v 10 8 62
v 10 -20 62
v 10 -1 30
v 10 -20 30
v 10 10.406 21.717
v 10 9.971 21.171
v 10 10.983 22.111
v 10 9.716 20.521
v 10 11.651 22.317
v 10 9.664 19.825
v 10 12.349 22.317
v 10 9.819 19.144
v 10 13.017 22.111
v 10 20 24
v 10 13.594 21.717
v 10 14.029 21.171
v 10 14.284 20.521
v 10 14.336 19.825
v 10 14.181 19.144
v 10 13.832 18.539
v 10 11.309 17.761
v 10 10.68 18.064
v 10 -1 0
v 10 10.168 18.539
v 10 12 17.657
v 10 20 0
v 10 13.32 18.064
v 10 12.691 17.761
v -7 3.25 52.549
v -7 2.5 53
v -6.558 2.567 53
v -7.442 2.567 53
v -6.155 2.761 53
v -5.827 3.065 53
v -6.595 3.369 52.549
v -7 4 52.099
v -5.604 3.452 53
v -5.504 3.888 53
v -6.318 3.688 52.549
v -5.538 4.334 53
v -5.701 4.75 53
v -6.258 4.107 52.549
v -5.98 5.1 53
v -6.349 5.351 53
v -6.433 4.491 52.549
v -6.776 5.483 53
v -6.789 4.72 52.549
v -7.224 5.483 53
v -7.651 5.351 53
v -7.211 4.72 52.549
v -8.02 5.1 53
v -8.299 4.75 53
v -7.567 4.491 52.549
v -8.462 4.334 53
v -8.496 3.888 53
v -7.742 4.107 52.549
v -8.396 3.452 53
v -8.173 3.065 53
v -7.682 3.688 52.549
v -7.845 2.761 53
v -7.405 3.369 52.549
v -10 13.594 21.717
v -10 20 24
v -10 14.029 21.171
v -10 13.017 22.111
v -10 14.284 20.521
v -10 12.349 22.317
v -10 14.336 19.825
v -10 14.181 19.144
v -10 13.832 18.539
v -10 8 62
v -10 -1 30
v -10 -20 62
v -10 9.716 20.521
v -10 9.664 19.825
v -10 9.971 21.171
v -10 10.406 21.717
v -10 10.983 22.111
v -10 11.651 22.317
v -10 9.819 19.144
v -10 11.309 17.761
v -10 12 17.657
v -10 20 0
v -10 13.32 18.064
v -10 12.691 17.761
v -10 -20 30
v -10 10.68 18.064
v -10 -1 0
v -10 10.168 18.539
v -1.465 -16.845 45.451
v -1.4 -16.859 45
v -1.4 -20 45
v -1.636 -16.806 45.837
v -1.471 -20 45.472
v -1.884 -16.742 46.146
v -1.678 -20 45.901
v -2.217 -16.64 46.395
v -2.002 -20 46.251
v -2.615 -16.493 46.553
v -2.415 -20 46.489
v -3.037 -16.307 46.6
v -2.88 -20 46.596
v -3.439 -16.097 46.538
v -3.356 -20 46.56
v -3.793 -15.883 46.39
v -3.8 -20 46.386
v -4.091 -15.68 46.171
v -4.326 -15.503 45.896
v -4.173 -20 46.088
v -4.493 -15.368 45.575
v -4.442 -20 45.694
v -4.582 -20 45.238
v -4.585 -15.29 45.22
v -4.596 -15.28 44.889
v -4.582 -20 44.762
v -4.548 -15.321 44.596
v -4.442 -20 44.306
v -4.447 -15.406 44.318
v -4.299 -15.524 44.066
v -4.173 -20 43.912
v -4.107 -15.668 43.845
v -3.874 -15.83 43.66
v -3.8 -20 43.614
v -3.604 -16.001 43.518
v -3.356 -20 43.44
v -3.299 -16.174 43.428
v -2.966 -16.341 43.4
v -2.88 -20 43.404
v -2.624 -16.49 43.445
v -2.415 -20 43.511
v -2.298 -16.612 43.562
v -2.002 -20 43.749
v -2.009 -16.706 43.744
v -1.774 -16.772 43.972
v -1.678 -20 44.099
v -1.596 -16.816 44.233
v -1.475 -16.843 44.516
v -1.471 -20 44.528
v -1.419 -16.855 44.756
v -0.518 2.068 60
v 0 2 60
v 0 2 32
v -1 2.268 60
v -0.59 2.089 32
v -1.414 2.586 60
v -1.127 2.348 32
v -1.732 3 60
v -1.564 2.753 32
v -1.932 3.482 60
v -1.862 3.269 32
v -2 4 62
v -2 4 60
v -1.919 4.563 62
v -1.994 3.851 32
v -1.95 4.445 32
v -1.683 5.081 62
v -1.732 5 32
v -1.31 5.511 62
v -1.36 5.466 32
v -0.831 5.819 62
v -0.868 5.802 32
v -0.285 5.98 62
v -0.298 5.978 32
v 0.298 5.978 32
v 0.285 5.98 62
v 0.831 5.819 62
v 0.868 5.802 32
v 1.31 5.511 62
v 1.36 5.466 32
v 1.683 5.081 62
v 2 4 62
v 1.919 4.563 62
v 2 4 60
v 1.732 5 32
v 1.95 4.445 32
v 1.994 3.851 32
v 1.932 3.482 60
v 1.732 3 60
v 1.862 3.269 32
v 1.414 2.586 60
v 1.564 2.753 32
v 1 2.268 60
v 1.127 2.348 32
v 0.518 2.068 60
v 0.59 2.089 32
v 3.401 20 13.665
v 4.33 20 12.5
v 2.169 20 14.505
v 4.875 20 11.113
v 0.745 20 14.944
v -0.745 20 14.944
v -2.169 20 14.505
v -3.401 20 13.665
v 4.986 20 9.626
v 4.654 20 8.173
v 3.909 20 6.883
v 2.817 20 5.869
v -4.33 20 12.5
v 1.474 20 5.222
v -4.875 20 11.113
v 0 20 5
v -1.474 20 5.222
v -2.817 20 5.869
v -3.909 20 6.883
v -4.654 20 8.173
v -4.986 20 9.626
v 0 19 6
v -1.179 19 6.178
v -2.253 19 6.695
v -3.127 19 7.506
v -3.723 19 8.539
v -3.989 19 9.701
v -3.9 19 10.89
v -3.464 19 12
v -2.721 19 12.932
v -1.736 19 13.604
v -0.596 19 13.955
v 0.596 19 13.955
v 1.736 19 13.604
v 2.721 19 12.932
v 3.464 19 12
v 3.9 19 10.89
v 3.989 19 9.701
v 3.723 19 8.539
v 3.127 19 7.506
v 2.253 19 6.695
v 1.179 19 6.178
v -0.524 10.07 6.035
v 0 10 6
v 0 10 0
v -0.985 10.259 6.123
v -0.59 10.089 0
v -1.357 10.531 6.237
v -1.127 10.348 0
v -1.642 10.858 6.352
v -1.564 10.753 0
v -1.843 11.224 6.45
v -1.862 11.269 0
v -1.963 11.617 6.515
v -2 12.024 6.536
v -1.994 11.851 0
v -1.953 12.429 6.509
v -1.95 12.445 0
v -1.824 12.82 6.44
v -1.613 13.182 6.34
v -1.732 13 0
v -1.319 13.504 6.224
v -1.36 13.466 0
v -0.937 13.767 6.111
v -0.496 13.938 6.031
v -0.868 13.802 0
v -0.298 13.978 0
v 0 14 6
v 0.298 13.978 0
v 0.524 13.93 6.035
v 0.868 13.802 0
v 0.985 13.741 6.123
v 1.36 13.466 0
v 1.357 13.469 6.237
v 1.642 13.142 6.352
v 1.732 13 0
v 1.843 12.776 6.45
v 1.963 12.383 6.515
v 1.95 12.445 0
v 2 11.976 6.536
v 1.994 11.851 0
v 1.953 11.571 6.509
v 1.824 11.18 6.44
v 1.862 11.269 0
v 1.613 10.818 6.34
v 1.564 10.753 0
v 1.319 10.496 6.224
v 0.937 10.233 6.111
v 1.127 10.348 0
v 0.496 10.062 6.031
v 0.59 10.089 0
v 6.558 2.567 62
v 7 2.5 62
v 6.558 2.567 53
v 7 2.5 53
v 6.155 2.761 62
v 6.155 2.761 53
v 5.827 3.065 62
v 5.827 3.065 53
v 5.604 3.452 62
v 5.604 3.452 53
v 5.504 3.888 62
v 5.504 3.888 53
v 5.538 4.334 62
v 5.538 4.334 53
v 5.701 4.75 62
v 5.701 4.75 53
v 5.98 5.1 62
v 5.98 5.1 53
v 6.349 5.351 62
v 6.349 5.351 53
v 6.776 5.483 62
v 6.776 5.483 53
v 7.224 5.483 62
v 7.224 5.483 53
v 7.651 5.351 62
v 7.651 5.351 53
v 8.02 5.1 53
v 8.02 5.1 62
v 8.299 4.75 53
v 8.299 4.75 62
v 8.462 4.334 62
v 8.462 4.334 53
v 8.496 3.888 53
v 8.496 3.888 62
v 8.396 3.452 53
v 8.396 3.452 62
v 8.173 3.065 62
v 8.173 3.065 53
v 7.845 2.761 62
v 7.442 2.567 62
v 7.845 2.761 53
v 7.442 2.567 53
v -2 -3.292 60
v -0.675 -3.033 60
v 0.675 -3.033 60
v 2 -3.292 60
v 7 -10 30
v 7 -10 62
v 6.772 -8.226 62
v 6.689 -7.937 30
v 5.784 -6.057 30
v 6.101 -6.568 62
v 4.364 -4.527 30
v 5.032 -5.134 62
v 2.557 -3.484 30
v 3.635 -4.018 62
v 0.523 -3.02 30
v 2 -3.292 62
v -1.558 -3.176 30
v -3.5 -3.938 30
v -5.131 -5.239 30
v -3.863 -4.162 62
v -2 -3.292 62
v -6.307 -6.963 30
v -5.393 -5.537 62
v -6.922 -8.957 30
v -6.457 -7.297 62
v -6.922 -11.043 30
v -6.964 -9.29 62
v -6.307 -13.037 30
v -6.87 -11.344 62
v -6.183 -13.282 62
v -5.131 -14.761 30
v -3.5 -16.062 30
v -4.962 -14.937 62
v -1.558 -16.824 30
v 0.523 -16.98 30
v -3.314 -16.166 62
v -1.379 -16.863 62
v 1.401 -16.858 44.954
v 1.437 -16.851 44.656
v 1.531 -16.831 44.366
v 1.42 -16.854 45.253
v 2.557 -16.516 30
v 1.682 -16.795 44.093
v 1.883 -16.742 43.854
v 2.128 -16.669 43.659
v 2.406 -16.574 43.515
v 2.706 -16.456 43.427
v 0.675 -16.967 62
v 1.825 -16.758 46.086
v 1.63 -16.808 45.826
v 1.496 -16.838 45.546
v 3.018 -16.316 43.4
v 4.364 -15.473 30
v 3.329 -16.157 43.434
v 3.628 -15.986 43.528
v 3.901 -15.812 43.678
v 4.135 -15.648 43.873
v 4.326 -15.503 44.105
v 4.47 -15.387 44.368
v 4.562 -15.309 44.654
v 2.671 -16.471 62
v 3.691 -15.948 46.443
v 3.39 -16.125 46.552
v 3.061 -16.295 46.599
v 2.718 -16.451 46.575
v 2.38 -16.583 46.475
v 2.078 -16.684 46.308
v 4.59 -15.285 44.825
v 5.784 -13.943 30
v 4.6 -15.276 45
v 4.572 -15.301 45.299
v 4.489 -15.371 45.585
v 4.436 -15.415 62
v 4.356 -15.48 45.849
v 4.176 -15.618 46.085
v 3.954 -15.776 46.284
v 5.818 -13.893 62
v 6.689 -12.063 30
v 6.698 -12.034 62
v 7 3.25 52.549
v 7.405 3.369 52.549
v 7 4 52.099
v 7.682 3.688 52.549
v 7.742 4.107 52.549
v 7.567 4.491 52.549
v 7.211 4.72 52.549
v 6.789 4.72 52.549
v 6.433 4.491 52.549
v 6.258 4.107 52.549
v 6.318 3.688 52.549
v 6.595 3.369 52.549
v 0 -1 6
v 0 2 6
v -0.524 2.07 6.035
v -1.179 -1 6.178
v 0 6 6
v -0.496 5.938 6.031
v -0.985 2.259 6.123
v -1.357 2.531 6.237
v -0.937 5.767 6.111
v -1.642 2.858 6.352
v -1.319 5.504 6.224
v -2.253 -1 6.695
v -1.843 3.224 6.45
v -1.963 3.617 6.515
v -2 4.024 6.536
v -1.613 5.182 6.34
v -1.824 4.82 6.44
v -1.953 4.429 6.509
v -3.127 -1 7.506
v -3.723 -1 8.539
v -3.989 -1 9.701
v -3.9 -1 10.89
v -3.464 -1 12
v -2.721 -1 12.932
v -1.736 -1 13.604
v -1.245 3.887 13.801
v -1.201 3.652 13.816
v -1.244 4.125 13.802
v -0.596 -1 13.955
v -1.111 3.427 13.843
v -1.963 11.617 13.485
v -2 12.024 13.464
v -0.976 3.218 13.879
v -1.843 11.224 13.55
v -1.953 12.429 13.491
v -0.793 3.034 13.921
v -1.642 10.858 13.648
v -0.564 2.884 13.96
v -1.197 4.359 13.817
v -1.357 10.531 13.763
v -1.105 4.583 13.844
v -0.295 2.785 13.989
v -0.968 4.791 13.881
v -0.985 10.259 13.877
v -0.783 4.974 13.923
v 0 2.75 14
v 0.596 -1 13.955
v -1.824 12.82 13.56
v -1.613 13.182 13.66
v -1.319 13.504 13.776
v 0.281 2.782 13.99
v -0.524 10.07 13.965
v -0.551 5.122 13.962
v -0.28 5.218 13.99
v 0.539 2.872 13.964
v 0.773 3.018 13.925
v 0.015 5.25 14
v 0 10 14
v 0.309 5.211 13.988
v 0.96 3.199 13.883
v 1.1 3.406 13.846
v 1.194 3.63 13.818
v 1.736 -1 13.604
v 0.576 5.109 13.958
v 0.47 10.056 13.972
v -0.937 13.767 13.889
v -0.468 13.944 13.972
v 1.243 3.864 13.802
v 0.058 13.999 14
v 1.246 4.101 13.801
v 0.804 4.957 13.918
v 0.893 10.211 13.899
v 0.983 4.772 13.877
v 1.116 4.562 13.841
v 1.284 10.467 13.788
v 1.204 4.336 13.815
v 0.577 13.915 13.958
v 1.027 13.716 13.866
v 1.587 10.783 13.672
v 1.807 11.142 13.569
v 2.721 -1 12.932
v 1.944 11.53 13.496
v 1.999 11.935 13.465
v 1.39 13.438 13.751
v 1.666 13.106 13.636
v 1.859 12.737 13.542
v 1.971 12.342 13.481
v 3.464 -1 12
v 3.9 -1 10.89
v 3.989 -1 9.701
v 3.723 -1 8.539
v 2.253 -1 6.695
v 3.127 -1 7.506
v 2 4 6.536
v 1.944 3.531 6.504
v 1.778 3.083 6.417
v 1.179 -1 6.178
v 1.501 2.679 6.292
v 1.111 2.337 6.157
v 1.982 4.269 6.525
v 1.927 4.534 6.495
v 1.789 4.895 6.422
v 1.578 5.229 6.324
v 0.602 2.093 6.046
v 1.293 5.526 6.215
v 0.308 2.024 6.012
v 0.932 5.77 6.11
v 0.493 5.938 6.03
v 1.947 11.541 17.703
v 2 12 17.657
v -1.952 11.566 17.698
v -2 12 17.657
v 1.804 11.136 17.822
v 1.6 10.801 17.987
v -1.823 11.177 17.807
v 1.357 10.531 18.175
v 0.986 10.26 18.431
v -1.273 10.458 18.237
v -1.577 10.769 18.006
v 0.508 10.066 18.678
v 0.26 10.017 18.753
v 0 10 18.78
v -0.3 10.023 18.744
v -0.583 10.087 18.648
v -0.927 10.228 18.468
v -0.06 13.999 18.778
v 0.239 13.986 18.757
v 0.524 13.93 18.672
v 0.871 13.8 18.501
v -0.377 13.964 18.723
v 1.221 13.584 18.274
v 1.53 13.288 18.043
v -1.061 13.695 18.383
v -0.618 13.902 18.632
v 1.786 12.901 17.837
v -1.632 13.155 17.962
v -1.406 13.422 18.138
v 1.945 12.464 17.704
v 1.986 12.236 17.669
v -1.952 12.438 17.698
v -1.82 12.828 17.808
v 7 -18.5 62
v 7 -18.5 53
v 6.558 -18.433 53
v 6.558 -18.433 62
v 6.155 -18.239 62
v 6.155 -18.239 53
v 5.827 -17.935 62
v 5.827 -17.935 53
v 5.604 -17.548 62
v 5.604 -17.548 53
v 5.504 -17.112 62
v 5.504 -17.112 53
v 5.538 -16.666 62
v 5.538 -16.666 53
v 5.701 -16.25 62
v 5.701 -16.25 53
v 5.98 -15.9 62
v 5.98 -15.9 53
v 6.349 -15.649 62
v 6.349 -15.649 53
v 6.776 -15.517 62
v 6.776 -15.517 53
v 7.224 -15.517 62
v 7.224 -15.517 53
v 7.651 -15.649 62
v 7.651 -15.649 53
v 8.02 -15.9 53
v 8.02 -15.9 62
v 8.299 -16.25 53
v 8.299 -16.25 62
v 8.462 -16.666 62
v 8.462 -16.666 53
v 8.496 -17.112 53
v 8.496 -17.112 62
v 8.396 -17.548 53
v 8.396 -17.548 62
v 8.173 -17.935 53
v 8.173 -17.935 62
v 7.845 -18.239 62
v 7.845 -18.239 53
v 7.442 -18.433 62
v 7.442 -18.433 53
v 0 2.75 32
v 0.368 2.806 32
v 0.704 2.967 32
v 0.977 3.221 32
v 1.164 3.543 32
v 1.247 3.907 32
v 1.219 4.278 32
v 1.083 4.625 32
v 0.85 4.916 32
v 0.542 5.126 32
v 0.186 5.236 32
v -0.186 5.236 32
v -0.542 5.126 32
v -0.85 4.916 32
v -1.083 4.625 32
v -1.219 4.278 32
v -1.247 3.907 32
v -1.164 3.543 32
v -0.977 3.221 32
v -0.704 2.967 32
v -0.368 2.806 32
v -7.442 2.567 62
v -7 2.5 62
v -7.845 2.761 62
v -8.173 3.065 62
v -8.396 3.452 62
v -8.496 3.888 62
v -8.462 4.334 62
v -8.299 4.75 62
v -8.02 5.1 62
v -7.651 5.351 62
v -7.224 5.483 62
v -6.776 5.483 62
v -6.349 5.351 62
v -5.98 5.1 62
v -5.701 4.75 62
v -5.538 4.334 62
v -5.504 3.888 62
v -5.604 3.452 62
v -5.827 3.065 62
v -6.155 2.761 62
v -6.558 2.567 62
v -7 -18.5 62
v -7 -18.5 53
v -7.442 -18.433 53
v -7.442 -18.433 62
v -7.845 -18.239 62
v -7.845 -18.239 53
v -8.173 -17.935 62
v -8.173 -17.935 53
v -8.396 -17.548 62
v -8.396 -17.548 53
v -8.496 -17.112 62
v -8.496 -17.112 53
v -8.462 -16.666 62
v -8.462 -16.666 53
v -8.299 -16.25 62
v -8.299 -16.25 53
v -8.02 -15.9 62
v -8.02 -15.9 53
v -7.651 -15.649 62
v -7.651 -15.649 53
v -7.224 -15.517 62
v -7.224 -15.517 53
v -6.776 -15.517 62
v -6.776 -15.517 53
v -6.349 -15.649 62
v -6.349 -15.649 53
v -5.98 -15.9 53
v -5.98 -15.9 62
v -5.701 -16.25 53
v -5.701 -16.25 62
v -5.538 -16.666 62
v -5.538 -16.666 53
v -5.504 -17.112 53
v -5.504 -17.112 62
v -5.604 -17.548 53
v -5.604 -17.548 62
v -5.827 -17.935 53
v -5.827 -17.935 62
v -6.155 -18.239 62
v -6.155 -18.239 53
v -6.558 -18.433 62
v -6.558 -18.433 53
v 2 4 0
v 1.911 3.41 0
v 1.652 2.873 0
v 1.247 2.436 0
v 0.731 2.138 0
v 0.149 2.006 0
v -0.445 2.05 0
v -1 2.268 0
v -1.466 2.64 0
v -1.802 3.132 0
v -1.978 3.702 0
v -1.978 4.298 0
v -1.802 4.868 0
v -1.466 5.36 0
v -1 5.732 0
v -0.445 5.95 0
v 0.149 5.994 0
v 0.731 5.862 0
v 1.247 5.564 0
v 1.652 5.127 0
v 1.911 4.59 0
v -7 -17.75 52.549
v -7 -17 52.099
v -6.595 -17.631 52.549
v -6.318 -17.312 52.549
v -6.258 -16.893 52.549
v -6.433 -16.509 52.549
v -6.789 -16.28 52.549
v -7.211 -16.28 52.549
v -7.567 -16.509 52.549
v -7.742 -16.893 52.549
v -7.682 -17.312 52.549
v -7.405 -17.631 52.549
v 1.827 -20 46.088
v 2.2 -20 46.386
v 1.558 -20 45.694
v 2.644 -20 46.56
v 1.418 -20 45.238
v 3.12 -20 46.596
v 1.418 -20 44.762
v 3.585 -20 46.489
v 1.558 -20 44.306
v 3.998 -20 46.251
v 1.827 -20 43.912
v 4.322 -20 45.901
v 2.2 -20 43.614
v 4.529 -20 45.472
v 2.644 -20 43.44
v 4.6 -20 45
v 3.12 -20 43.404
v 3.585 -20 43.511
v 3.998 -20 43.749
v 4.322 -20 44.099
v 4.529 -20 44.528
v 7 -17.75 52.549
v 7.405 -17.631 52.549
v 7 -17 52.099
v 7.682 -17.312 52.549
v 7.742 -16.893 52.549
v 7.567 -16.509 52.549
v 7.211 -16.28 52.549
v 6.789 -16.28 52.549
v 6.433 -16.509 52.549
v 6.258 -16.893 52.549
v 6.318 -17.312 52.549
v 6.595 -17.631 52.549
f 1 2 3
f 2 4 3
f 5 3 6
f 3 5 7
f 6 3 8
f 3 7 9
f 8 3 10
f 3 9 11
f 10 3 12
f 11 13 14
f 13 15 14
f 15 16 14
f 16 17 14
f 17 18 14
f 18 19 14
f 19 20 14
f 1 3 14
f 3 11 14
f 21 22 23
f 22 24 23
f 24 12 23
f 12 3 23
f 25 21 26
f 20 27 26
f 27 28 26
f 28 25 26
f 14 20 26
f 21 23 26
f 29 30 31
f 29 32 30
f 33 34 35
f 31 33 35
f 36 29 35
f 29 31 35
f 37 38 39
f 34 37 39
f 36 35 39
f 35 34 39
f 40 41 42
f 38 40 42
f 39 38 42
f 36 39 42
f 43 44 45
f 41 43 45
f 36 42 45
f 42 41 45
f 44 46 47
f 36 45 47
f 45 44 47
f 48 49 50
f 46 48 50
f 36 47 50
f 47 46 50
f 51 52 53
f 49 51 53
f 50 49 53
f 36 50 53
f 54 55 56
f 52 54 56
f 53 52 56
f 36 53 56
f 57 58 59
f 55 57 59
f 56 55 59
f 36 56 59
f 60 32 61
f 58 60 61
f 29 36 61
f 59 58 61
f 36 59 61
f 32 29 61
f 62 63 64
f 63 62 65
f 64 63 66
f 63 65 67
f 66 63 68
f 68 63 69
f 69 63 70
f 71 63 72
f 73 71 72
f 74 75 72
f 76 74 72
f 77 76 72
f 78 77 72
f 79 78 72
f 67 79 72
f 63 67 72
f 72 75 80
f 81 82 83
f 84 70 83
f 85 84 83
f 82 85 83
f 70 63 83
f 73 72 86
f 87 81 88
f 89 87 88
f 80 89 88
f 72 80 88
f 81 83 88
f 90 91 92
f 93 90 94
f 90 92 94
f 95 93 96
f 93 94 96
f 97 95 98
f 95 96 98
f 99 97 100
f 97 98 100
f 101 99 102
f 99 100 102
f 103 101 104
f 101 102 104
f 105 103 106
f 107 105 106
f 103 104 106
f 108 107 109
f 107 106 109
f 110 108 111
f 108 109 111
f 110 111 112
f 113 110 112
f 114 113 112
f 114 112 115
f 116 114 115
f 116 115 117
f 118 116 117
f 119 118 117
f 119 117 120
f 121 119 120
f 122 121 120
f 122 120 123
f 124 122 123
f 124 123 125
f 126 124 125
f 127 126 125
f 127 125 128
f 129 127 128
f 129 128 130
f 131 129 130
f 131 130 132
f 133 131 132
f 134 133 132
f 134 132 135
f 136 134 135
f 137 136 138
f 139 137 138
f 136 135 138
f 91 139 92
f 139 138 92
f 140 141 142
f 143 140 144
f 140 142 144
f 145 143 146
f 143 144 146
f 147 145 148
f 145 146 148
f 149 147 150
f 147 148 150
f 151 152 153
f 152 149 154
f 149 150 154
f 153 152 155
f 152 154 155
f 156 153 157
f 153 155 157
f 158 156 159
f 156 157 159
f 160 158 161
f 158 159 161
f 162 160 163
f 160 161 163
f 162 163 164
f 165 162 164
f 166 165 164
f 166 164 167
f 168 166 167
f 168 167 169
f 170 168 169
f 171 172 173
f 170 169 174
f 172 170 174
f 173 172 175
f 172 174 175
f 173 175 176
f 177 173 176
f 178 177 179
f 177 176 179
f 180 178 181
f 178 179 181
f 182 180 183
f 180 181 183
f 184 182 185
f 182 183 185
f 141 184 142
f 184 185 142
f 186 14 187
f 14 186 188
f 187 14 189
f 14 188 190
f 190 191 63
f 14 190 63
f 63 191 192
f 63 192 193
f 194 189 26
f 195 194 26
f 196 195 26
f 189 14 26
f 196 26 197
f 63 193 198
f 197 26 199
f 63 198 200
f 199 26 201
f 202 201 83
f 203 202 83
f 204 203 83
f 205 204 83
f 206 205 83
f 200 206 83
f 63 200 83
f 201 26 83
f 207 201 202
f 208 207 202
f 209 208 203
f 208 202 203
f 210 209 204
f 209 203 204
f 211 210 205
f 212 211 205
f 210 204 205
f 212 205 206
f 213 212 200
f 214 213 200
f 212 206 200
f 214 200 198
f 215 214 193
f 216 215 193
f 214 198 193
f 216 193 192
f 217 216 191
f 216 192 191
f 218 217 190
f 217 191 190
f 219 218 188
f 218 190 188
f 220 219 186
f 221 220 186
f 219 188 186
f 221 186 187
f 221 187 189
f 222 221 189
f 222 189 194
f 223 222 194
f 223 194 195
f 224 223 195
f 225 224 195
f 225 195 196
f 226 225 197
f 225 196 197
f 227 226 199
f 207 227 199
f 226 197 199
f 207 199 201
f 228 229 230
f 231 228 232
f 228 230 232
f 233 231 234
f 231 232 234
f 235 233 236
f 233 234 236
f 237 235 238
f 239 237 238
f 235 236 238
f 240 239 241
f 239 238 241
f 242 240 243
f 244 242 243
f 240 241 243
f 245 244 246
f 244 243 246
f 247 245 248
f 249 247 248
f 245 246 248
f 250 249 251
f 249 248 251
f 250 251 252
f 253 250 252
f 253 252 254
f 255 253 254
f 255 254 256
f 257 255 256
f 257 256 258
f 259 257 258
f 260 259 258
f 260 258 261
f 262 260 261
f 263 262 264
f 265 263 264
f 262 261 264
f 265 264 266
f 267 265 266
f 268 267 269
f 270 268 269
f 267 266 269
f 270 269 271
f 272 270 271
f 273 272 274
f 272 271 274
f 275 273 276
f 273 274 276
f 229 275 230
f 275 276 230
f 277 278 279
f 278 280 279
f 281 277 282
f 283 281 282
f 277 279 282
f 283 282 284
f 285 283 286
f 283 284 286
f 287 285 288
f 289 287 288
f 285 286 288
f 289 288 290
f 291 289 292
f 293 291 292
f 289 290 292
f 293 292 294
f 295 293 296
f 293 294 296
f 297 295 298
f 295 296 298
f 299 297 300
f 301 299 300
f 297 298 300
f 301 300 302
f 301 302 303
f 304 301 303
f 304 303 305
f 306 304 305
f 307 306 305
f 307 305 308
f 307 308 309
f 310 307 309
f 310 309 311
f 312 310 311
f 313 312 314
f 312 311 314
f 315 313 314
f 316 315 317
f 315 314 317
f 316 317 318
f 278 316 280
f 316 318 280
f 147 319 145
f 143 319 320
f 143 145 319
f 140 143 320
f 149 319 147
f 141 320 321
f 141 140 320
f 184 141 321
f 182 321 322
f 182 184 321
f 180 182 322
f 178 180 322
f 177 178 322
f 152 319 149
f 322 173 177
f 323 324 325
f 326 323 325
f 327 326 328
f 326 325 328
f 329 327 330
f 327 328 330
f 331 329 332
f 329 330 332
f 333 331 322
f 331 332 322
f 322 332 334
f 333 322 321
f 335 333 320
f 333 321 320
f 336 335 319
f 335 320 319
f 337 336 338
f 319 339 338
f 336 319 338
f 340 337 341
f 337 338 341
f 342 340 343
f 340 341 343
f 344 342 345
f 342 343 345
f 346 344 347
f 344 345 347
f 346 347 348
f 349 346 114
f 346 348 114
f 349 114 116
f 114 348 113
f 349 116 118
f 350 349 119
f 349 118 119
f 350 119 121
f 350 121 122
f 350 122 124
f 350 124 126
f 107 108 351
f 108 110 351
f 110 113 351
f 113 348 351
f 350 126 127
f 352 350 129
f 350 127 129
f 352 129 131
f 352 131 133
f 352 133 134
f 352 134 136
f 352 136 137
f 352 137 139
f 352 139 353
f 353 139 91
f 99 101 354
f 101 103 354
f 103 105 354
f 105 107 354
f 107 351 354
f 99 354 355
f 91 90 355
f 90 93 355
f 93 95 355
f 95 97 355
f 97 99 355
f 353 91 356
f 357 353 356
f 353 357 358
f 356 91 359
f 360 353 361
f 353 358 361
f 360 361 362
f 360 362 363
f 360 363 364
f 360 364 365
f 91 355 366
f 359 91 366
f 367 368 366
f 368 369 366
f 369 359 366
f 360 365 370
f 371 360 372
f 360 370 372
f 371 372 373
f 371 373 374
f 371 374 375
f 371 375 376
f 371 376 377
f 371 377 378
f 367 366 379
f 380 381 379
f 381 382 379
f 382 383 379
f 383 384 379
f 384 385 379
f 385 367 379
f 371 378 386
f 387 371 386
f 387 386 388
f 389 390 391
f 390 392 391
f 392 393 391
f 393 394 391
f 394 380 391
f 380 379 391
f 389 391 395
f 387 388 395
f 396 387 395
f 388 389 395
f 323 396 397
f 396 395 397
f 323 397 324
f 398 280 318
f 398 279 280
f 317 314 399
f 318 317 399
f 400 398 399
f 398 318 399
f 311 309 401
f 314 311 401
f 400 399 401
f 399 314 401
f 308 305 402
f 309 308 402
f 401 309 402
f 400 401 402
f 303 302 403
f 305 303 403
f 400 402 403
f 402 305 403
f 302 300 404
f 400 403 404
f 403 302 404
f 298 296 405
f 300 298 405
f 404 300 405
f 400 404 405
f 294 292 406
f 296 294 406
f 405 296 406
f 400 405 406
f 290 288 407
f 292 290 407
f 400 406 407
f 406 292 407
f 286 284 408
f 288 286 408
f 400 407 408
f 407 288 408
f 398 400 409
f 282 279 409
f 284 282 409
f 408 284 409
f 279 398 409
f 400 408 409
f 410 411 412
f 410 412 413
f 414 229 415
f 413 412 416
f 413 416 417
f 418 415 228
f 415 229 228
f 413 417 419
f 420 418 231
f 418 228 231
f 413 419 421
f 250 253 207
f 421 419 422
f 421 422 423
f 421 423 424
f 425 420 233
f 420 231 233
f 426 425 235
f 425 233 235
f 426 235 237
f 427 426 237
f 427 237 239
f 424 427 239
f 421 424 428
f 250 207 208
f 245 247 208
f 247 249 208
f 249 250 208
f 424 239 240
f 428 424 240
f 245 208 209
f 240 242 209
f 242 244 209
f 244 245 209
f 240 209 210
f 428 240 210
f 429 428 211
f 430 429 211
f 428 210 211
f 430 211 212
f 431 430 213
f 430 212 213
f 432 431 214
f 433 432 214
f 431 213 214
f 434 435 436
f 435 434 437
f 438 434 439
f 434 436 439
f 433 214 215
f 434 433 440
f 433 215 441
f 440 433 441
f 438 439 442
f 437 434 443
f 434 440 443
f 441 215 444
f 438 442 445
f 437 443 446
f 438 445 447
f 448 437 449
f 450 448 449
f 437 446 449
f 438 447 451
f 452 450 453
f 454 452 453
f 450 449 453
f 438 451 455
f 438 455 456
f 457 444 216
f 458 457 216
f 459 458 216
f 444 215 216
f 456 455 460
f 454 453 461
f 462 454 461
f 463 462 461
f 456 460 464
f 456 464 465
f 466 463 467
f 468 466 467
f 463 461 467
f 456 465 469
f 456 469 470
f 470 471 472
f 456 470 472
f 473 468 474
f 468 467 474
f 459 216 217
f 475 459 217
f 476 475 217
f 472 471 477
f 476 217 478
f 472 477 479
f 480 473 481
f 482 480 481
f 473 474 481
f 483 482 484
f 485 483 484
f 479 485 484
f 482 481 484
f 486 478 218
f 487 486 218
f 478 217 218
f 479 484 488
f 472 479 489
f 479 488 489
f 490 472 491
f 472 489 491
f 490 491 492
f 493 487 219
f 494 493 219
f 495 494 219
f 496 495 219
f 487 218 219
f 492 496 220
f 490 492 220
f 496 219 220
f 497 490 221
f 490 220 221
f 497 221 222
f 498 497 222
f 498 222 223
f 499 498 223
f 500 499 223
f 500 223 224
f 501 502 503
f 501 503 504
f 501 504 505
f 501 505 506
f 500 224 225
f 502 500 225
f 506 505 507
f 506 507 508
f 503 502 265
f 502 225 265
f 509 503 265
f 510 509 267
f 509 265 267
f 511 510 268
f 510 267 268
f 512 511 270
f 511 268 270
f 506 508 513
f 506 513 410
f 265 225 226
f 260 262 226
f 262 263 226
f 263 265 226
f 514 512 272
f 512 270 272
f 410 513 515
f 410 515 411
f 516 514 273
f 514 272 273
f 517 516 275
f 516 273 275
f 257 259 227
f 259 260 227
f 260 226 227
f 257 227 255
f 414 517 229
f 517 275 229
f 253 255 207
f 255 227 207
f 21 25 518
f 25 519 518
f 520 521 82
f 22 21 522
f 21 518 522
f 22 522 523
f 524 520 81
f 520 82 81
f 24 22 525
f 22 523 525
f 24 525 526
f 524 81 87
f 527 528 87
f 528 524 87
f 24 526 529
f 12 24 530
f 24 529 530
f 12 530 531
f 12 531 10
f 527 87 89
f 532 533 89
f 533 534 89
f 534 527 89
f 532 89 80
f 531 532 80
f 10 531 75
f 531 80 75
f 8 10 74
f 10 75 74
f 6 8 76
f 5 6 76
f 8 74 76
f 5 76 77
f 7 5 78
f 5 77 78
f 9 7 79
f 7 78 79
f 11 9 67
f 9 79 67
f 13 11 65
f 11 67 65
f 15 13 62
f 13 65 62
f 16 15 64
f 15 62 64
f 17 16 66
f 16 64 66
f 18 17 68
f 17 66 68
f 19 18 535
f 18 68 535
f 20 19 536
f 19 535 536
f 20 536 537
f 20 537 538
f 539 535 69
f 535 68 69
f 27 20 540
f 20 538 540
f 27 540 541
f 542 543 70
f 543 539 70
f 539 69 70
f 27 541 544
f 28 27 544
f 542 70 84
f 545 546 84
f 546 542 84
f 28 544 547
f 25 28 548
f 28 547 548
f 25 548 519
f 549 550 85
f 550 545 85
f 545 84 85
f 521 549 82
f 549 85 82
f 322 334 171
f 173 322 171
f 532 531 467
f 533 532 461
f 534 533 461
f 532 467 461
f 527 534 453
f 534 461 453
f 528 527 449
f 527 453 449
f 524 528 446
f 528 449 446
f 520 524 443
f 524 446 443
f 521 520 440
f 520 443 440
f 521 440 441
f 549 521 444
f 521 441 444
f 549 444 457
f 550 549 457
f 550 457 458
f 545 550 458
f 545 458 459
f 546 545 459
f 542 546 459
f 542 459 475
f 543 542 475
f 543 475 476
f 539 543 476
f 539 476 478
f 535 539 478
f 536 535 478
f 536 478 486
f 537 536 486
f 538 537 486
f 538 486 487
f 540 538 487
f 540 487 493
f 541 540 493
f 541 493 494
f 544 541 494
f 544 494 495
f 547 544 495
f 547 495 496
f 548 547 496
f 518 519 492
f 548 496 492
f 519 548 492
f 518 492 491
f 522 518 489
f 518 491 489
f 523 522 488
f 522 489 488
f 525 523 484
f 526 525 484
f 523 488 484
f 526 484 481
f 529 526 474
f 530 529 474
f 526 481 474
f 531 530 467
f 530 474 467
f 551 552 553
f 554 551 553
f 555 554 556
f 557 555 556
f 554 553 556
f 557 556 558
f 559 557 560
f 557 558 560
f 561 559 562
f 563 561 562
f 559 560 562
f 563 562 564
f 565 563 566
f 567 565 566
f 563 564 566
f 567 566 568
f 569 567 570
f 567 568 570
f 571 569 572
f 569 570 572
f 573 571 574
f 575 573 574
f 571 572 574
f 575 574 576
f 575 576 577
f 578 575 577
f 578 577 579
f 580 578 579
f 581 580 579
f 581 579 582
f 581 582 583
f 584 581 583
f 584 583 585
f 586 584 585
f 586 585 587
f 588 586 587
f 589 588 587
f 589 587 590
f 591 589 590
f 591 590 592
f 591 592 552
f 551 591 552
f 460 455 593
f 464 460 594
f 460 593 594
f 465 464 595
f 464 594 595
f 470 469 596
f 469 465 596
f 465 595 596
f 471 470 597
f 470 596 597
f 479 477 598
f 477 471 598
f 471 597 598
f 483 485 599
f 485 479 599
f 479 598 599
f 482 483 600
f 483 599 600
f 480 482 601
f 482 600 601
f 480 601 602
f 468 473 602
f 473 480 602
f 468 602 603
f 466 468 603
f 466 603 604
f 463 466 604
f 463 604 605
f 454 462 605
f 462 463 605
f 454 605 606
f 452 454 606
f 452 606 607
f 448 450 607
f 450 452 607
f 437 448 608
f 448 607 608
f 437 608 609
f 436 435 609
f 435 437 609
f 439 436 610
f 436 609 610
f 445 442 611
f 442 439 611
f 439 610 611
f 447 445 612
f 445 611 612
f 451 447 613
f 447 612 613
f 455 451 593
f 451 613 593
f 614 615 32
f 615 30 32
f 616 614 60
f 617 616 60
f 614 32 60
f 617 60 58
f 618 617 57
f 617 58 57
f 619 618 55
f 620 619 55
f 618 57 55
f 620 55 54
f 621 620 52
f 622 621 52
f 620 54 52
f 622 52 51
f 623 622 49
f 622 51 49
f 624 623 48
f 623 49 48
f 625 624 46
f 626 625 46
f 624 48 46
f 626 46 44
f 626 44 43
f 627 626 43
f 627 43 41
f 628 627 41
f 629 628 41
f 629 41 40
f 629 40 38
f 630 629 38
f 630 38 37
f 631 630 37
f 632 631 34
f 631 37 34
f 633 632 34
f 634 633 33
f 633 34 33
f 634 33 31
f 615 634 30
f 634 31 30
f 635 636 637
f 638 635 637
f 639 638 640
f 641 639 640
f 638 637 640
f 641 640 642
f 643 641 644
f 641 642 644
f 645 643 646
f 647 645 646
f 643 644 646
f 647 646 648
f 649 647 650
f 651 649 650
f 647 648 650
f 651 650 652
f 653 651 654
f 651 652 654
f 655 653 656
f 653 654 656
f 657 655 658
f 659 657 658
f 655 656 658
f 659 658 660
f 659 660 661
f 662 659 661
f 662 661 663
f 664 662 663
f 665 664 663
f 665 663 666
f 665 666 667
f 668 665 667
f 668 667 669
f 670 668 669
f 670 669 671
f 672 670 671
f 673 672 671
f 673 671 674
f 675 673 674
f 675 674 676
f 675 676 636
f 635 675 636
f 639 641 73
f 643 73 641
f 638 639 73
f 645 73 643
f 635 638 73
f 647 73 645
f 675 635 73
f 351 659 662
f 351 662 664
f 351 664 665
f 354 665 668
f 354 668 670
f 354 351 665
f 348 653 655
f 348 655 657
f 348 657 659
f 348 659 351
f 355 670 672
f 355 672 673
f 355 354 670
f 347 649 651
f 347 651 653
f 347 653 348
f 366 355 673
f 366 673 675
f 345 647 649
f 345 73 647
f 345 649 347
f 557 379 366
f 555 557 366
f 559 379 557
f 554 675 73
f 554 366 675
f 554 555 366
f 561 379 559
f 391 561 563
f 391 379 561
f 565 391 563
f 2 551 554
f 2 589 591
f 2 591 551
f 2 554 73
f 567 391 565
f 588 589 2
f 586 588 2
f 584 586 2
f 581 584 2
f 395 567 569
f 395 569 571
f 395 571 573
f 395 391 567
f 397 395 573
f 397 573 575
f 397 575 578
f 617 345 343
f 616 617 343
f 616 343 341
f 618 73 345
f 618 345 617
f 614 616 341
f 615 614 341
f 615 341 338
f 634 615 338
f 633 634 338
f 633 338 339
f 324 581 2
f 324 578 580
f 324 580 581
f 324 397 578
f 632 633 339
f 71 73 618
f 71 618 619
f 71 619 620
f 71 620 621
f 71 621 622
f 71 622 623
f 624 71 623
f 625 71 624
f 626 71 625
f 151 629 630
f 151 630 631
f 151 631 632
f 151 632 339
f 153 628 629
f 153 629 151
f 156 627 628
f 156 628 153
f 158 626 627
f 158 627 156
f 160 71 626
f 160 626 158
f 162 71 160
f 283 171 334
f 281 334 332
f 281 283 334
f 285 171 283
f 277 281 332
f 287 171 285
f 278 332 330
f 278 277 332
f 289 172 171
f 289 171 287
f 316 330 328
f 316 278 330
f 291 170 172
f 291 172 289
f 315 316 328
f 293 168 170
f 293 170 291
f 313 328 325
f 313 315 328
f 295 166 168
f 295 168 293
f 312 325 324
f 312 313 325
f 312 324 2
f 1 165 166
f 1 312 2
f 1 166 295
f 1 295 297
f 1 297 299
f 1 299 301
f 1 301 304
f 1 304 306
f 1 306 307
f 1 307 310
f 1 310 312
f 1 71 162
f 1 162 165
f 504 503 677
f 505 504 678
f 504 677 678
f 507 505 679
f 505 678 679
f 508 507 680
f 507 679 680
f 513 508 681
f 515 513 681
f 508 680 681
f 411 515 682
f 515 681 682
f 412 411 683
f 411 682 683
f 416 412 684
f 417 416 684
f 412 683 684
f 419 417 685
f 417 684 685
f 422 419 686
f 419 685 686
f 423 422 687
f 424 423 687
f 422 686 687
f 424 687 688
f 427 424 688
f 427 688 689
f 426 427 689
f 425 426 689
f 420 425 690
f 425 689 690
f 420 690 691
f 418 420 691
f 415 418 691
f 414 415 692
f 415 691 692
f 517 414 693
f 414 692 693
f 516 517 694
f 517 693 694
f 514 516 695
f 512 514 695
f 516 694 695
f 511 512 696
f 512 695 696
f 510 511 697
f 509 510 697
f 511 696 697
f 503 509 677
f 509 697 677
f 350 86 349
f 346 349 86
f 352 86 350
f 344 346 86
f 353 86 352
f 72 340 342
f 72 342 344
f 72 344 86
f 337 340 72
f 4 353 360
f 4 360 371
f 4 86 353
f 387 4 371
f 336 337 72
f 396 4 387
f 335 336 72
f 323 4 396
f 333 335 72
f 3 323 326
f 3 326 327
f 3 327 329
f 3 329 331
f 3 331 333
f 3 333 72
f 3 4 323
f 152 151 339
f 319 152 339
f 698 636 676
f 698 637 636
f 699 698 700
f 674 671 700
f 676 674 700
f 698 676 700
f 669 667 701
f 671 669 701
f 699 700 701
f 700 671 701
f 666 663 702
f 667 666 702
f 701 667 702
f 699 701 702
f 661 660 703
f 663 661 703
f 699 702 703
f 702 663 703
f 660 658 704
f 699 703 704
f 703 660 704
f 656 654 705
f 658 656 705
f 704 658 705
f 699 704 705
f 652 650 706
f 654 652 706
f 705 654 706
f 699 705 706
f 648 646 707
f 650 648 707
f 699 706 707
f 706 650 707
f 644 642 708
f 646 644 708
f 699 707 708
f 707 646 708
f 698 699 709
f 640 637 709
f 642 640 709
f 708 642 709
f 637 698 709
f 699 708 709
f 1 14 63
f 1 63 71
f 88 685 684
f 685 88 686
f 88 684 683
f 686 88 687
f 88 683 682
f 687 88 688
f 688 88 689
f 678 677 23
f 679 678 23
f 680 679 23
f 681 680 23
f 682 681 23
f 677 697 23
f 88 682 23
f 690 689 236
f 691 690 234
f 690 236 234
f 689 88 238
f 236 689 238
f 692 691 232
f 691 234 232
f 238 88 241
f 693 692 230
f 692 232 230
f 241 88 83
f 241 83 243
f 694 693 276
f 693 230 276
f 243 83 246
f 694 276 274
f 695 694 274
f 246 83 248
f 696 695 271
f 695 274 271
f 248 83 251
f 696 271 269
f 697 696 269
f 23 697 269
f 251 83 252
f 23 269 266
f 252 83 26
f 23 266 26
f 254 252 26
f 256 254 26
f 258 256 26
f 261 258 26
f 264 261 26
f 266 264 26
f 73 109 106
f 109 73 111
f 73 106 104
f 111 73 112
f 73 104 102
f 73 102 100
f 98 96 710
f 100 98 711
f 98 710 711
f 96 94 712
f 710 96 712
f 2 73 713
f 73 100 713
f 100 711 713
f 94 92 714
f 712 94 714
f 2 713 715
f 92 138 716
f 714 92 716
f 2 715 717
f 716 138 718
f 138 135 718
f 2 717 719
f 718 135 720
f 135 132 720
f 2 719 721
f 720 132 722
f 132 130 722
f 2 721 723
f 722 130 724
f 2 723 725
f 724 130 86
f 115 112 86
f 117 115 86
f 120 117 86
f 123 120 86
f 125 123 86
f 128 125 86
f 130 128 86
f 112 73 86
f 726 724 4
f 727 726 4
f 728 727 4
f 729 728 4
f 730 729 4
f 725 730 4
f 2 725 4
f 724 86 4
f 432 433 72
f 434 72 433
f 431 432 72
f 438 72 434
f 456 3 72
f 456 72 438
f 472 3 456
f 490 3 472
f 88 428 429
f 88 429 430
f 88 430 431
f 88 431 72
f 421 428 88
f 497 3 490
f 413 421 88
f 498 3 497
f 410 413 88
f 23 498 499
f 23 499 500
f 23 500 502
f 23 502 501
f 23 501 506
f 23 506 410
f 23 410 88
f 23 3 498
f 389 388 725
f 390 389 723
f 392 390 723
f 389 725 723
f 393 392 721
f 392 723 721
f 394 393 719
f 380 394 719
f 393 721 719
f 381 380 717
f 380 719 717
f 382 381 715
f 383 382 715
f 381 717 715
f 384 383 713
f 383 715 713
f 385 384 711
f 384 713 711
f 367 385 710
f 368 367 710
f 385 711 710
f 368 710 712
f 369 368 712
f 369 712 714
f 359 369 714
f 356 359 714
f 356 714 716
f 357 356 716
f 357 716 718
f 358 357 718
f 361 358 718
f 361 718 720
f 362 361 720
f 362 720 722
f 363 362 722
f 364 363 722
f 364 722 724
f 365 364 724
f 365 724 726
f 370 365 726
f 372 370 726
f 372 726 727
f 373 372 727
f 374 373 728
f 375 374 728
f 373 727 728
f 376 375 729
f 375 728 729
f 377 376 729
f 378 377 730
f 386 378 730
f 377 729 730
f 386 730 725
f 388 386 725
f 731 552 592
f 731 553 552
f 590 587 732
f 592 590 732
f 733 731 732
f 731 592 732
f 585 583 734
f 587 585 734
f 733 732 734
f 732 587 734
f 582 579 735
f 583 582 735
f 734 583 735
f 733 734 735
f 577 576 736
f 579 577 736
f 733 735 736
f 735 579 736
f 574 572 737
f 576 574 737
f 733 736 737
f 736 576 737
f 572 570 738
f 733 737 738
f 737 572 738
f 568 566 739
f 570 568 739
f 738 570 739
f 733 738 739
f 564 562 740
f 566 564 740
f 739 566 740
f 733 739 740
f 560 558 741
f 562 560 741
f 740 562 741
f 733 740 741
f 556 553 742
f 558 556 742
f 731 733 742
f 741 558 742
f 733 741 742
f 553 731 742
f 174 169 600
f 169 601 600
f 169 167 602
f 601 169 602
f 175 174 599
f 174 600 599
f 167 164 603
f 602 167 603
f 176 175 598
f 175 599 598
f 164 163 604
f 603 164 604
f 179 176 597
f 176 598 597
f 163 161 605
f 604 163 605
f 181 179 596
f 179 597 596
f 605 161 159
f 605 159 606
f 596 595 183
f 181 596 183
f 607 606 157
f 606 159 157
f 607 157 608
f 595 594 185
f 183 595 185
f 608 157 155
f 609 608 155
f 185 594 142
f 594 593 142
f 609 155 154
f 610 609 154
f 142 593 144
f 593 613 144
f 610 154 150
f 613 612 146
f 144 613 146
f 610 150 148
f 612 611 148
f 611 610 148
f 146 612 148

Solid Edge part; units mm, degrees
sketch "Sketch1" plane through (0, 0, 0) normal (0, 0, 1) x (1, 0, 0)
  line L0 (-10, -20) -> (10, -20)
  line L1 (10, -20) -> (10, 20)
  line L2 (10, 20) -> (-10, 20)
  line L3 (-10, 20) -> (-10, -20)
extrude "Protrusion1" add sketch "Sketch1" along normal blind 62
sketch "Sketch2" plane through (-10, 0, 31) normal (-1, 0, 0) x (0, -1, 0)
  line L0 (20, -31) -> (20, -1)
  line L1 (20, -1) -> (1, -1)
  line L2 (1, -1) -> (1, -31)
  line L3 (1, -31) -> (20, -31)
  dimension "D1" = 21
extrude "Cutout1" cut sketch "Sketch2" along normal through all and the other way through all
sketch "Sketch3" plane through (-10, 0, 31) normal (-1, 0, 0) x (0, -1, 0)
  line L0 (-20, 31) -> (-8, 31)
  line L1 (-20, -7) -> (-8, 31)
  line L2 (-20, 31) -> (-20, -7)
extrude "Cutout2" cut sketch "Sketch3" along normal through all and the other way through all
hole "Hole1" at (7, 4, 62) direction (0, 0, -1) diameter 3 depth 9 tip angle 118
hole "Hole2" at (-7, 4, 62) direction (0, 0, -1) diameter 3 depth 9 tip angle 118
hole "Hole3" at (-7, -17, 62) direction (0, 0, -1) diameter 3 depth 9 tip angle 118
hole "Hole4" at (7, -17, 62) direction (0, 0, -1) diameter 3 depth 9 tip angle 118
sketch "Sketch4" plane through (0, -6, 62) normal (0, 0, 1) x (1, 0, 0)
  circle A0 centre (0, -4) radius 7
  dimension "D1" = 30
extrude "Cutout3" cut sketch "Sketch4" along normal up to next and the other way up to next
sketch "Sketch5" plane through (0, -20, 46) normal (0, -1, 0) x (1, 0, 0)
  circle A0 centre (-3, -1) radius 1.6
  circle A1 centre (3, -1) radius 1.6
  dimension "D1" = 17
  dimension "D2" = 3.2
  dimension "D3" = 3
  dimension "D4" = 3
  dimension "D5" = 17
extrude "Cutout4" cut sketch "Sketch5" along normal up to next and the other way up to next
sketch "Sketch6" plane through (0, 20, 12) normal (0, 1, 0) x (0, 0, -1)
  circle A0 centre (2, 0) radius 4
  dimension "D1" = 10
extrude "Cutout5" cut sketch "Sketch6" along normal up to next and the other way up to next
chamfer "Fase_an_schaft" distance 1 angle 45 1 edges at (0, 20, 14)
sketch "Sketch7" plane through (0, 9.5, 0) normal (0, 0, -1) x (1, 0, 0)
  circle A0 centre (0, 5.5) radius 2
  dimension "D1" = 16
extrude "Cutout6" cut sketch "Sketch7" along normal up to next and the other way up to next
hole "auslass_oben" at (0, 4, 62) direction (0, 0, -1) diameter 2.5 end up to next counterbore diameter 4 counterbore depth 30
sketch "Sketch8" plane through (-10, 0, 31) normal (-1, 0, 0) x (0, 0, -1)
  circle A0 centre (11, -12) radius 2.3428
  dimension "D1" = 20
  dimension "D2" = 8
extrude "Cutout7" cut sketch "Sketch8" along normal up to next and the other way up to next
sketch "Sketch9" plane through (0, 9.5, 0) normal (0, 0, -1) x (0, -1, 0)
  circle A0 centre (-2.5, 0) radius 2
  dimension "D1" = 8
extrude "auslassloch_hinten" cut sketch "Sketch9" against normal blind 20
sketch "Sketch10" plane through (0, -6, 62) normal (0, 0, 1) x (0, -1, 0)
  line L0 (-10, -2) -> (1.0843, -2)
  line L1 (1.0843, -2) -> (1.0843, 2)
  line L2 (1.0843, 2) -> (-10, 2)
  line L3 (-10, 2) -> (-10, -2)
  dimension "D1" = 4
extrude "fräsung_oben" cut sketch "Sketch10" against normal blind 2
